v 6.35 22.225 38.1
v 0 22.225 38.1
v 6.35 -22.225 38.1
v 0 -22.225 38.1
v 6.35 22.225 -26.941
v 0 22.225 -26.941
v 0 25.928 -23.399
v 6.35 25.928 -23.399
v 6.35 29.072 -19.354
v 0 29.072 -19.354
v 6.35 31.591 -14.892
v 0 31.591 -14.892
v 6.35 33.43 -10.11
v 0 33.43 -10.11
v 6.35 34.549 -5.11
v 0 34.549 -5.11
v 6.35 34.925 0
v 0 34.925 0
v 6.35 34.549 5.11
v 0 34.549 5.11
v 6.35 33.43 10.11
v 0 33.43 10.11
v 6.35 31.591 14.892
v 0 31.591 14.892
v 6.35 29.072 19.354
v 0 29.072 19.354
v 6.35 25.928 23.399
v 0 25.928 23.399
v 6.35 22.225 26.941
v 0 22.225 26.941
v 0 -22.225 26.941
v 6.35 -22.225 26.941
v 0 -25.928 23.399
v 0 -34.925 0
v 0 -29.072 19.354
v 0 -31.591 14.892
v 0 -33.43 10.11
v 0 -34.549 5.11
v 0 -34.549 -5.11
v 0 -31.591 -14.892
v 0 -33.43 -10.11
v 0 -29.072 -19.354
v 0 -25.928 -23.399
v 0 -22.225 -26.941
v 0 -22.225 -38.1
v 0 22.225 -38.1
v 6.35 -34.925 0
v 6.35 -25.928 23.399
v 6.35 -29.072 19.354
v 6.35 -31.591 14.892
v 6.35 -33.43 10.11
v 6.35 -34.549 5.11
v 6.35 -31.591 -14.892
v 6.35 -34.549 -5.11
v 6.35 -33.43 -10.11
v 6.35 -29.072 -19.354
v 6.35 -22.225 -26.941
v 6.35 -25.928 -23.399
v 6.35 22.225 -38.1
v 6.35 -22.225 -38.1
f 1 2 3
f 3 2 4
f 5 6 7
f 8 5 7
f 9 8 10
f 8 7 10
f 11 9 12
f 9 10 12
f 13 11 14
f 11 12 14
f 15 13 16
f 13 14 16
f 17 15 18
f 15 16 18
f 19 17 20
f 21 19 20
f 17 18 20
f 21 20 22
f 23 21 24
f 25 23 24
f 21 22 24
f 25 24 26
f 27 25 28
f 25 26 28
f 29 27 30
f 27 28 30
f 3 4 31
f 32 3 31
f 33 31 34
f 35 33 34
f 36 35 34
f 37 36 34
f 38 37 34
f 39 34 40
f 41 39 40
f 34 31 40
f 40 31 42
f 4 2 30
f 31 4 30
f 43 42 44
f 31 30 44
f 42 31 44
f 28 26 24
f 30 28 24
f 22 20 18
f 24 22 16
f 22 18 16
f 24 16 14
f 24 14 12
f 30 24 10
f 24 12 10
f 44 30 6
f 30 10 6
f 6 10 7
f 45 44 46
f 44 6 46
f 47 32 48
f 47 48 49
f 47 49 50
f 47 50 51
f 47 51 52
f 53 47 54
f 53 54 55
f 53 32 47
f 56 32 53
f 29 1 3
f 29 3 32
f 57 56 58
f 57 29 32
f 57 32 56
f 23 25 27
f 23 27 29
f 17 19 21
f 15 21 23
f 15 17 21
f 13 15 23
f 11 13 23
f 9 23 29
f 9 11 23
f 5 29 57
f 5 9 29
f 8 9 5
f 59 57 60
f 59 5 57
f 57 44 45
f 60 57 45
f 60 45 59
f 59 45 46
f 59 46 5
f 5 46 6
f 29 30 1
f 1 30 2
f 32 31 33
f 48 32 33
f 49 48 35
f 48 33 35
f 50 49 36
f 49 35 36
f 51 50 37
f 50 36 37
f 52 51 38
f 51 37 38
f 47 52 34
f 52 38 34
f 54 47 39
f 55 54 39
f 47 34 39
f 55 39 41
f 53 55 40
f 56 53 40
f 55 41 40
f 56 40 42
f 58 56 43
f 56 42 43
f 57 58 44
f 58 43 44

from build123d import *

# Parameters (mm, degrees)
BOSS_EXTRUDE1_DEPTH = 6.35


with BuildPart() as part:
    # Sketch1 → Boss-Extrude1 (new body)
    with BuildSketch(Plane(origin=(0, 0, 0), x_dir=(0, 0, -1), z_dir=(1, 0, 0))):
        with BuildLine():
            ThreePointArc((-26.940768363, 22.225), (-34.925, 0), (-26.940768363, -22.225))
            Line((-26.940768363, -22.225), (26.940768363, -22.225))
            ThreePointArc((26.940768363, -22.225), (32.868388766, -11.807821347), (34.925, 0))
            ThreePointArc((34.925, 0), (32.868388766, 11.807821347), (26.940768363, 22.225))
            Line((26.940768363, 22.225), (-26.940768363, 22.225))
        make_face()
        with BuildLine():
            Line((-38.1, 22.225), (-38.1, -22.225))
            Line((-38.1, -22.225), (-26.940768363, -22.225))
            ThreePointArc((-26.940768363, -22.225), (-34.925, 0), (-26.940768363, 22.225))
            Line((-26.940768363, 22.225), (-38.1, 22.225))
        make_face()
        with BuildLine():
            ThreePointArc((26.940768363, 22.225), (0, 34.925), (-26.940768363, 22.225))
            Line((-26.940768363, 22.225), (26.940768363, 22.225))
        make_face()
        with BuildLine():
            ThreePointArc((34.925, 0), (32.868388766, -11.807821347), (26.940768363, -22.225))
            Line((26.940768363, -22.225), (38.1, -22.225))
            Line((38.1, -22.225), (38.1, 22.225))
            Line((38.1, 22.225), (26.940768363, 22.225))
            ThreePointArc((26.940768363, 22.225), (32.868388766, 11.807821347), (34.925, 0))
        make_face()
        with BuildLine():
            Line((26.940768363, -22.225), (-26.940768363, -22.225))
            ThreePointArc((-26.940768363, -22.225), (0, -34.925), (26.940768363, -22.225))
        make_face()
    extrude(amount=BOSS_EXTRUDE1_DEPTH)


solid = part.part
